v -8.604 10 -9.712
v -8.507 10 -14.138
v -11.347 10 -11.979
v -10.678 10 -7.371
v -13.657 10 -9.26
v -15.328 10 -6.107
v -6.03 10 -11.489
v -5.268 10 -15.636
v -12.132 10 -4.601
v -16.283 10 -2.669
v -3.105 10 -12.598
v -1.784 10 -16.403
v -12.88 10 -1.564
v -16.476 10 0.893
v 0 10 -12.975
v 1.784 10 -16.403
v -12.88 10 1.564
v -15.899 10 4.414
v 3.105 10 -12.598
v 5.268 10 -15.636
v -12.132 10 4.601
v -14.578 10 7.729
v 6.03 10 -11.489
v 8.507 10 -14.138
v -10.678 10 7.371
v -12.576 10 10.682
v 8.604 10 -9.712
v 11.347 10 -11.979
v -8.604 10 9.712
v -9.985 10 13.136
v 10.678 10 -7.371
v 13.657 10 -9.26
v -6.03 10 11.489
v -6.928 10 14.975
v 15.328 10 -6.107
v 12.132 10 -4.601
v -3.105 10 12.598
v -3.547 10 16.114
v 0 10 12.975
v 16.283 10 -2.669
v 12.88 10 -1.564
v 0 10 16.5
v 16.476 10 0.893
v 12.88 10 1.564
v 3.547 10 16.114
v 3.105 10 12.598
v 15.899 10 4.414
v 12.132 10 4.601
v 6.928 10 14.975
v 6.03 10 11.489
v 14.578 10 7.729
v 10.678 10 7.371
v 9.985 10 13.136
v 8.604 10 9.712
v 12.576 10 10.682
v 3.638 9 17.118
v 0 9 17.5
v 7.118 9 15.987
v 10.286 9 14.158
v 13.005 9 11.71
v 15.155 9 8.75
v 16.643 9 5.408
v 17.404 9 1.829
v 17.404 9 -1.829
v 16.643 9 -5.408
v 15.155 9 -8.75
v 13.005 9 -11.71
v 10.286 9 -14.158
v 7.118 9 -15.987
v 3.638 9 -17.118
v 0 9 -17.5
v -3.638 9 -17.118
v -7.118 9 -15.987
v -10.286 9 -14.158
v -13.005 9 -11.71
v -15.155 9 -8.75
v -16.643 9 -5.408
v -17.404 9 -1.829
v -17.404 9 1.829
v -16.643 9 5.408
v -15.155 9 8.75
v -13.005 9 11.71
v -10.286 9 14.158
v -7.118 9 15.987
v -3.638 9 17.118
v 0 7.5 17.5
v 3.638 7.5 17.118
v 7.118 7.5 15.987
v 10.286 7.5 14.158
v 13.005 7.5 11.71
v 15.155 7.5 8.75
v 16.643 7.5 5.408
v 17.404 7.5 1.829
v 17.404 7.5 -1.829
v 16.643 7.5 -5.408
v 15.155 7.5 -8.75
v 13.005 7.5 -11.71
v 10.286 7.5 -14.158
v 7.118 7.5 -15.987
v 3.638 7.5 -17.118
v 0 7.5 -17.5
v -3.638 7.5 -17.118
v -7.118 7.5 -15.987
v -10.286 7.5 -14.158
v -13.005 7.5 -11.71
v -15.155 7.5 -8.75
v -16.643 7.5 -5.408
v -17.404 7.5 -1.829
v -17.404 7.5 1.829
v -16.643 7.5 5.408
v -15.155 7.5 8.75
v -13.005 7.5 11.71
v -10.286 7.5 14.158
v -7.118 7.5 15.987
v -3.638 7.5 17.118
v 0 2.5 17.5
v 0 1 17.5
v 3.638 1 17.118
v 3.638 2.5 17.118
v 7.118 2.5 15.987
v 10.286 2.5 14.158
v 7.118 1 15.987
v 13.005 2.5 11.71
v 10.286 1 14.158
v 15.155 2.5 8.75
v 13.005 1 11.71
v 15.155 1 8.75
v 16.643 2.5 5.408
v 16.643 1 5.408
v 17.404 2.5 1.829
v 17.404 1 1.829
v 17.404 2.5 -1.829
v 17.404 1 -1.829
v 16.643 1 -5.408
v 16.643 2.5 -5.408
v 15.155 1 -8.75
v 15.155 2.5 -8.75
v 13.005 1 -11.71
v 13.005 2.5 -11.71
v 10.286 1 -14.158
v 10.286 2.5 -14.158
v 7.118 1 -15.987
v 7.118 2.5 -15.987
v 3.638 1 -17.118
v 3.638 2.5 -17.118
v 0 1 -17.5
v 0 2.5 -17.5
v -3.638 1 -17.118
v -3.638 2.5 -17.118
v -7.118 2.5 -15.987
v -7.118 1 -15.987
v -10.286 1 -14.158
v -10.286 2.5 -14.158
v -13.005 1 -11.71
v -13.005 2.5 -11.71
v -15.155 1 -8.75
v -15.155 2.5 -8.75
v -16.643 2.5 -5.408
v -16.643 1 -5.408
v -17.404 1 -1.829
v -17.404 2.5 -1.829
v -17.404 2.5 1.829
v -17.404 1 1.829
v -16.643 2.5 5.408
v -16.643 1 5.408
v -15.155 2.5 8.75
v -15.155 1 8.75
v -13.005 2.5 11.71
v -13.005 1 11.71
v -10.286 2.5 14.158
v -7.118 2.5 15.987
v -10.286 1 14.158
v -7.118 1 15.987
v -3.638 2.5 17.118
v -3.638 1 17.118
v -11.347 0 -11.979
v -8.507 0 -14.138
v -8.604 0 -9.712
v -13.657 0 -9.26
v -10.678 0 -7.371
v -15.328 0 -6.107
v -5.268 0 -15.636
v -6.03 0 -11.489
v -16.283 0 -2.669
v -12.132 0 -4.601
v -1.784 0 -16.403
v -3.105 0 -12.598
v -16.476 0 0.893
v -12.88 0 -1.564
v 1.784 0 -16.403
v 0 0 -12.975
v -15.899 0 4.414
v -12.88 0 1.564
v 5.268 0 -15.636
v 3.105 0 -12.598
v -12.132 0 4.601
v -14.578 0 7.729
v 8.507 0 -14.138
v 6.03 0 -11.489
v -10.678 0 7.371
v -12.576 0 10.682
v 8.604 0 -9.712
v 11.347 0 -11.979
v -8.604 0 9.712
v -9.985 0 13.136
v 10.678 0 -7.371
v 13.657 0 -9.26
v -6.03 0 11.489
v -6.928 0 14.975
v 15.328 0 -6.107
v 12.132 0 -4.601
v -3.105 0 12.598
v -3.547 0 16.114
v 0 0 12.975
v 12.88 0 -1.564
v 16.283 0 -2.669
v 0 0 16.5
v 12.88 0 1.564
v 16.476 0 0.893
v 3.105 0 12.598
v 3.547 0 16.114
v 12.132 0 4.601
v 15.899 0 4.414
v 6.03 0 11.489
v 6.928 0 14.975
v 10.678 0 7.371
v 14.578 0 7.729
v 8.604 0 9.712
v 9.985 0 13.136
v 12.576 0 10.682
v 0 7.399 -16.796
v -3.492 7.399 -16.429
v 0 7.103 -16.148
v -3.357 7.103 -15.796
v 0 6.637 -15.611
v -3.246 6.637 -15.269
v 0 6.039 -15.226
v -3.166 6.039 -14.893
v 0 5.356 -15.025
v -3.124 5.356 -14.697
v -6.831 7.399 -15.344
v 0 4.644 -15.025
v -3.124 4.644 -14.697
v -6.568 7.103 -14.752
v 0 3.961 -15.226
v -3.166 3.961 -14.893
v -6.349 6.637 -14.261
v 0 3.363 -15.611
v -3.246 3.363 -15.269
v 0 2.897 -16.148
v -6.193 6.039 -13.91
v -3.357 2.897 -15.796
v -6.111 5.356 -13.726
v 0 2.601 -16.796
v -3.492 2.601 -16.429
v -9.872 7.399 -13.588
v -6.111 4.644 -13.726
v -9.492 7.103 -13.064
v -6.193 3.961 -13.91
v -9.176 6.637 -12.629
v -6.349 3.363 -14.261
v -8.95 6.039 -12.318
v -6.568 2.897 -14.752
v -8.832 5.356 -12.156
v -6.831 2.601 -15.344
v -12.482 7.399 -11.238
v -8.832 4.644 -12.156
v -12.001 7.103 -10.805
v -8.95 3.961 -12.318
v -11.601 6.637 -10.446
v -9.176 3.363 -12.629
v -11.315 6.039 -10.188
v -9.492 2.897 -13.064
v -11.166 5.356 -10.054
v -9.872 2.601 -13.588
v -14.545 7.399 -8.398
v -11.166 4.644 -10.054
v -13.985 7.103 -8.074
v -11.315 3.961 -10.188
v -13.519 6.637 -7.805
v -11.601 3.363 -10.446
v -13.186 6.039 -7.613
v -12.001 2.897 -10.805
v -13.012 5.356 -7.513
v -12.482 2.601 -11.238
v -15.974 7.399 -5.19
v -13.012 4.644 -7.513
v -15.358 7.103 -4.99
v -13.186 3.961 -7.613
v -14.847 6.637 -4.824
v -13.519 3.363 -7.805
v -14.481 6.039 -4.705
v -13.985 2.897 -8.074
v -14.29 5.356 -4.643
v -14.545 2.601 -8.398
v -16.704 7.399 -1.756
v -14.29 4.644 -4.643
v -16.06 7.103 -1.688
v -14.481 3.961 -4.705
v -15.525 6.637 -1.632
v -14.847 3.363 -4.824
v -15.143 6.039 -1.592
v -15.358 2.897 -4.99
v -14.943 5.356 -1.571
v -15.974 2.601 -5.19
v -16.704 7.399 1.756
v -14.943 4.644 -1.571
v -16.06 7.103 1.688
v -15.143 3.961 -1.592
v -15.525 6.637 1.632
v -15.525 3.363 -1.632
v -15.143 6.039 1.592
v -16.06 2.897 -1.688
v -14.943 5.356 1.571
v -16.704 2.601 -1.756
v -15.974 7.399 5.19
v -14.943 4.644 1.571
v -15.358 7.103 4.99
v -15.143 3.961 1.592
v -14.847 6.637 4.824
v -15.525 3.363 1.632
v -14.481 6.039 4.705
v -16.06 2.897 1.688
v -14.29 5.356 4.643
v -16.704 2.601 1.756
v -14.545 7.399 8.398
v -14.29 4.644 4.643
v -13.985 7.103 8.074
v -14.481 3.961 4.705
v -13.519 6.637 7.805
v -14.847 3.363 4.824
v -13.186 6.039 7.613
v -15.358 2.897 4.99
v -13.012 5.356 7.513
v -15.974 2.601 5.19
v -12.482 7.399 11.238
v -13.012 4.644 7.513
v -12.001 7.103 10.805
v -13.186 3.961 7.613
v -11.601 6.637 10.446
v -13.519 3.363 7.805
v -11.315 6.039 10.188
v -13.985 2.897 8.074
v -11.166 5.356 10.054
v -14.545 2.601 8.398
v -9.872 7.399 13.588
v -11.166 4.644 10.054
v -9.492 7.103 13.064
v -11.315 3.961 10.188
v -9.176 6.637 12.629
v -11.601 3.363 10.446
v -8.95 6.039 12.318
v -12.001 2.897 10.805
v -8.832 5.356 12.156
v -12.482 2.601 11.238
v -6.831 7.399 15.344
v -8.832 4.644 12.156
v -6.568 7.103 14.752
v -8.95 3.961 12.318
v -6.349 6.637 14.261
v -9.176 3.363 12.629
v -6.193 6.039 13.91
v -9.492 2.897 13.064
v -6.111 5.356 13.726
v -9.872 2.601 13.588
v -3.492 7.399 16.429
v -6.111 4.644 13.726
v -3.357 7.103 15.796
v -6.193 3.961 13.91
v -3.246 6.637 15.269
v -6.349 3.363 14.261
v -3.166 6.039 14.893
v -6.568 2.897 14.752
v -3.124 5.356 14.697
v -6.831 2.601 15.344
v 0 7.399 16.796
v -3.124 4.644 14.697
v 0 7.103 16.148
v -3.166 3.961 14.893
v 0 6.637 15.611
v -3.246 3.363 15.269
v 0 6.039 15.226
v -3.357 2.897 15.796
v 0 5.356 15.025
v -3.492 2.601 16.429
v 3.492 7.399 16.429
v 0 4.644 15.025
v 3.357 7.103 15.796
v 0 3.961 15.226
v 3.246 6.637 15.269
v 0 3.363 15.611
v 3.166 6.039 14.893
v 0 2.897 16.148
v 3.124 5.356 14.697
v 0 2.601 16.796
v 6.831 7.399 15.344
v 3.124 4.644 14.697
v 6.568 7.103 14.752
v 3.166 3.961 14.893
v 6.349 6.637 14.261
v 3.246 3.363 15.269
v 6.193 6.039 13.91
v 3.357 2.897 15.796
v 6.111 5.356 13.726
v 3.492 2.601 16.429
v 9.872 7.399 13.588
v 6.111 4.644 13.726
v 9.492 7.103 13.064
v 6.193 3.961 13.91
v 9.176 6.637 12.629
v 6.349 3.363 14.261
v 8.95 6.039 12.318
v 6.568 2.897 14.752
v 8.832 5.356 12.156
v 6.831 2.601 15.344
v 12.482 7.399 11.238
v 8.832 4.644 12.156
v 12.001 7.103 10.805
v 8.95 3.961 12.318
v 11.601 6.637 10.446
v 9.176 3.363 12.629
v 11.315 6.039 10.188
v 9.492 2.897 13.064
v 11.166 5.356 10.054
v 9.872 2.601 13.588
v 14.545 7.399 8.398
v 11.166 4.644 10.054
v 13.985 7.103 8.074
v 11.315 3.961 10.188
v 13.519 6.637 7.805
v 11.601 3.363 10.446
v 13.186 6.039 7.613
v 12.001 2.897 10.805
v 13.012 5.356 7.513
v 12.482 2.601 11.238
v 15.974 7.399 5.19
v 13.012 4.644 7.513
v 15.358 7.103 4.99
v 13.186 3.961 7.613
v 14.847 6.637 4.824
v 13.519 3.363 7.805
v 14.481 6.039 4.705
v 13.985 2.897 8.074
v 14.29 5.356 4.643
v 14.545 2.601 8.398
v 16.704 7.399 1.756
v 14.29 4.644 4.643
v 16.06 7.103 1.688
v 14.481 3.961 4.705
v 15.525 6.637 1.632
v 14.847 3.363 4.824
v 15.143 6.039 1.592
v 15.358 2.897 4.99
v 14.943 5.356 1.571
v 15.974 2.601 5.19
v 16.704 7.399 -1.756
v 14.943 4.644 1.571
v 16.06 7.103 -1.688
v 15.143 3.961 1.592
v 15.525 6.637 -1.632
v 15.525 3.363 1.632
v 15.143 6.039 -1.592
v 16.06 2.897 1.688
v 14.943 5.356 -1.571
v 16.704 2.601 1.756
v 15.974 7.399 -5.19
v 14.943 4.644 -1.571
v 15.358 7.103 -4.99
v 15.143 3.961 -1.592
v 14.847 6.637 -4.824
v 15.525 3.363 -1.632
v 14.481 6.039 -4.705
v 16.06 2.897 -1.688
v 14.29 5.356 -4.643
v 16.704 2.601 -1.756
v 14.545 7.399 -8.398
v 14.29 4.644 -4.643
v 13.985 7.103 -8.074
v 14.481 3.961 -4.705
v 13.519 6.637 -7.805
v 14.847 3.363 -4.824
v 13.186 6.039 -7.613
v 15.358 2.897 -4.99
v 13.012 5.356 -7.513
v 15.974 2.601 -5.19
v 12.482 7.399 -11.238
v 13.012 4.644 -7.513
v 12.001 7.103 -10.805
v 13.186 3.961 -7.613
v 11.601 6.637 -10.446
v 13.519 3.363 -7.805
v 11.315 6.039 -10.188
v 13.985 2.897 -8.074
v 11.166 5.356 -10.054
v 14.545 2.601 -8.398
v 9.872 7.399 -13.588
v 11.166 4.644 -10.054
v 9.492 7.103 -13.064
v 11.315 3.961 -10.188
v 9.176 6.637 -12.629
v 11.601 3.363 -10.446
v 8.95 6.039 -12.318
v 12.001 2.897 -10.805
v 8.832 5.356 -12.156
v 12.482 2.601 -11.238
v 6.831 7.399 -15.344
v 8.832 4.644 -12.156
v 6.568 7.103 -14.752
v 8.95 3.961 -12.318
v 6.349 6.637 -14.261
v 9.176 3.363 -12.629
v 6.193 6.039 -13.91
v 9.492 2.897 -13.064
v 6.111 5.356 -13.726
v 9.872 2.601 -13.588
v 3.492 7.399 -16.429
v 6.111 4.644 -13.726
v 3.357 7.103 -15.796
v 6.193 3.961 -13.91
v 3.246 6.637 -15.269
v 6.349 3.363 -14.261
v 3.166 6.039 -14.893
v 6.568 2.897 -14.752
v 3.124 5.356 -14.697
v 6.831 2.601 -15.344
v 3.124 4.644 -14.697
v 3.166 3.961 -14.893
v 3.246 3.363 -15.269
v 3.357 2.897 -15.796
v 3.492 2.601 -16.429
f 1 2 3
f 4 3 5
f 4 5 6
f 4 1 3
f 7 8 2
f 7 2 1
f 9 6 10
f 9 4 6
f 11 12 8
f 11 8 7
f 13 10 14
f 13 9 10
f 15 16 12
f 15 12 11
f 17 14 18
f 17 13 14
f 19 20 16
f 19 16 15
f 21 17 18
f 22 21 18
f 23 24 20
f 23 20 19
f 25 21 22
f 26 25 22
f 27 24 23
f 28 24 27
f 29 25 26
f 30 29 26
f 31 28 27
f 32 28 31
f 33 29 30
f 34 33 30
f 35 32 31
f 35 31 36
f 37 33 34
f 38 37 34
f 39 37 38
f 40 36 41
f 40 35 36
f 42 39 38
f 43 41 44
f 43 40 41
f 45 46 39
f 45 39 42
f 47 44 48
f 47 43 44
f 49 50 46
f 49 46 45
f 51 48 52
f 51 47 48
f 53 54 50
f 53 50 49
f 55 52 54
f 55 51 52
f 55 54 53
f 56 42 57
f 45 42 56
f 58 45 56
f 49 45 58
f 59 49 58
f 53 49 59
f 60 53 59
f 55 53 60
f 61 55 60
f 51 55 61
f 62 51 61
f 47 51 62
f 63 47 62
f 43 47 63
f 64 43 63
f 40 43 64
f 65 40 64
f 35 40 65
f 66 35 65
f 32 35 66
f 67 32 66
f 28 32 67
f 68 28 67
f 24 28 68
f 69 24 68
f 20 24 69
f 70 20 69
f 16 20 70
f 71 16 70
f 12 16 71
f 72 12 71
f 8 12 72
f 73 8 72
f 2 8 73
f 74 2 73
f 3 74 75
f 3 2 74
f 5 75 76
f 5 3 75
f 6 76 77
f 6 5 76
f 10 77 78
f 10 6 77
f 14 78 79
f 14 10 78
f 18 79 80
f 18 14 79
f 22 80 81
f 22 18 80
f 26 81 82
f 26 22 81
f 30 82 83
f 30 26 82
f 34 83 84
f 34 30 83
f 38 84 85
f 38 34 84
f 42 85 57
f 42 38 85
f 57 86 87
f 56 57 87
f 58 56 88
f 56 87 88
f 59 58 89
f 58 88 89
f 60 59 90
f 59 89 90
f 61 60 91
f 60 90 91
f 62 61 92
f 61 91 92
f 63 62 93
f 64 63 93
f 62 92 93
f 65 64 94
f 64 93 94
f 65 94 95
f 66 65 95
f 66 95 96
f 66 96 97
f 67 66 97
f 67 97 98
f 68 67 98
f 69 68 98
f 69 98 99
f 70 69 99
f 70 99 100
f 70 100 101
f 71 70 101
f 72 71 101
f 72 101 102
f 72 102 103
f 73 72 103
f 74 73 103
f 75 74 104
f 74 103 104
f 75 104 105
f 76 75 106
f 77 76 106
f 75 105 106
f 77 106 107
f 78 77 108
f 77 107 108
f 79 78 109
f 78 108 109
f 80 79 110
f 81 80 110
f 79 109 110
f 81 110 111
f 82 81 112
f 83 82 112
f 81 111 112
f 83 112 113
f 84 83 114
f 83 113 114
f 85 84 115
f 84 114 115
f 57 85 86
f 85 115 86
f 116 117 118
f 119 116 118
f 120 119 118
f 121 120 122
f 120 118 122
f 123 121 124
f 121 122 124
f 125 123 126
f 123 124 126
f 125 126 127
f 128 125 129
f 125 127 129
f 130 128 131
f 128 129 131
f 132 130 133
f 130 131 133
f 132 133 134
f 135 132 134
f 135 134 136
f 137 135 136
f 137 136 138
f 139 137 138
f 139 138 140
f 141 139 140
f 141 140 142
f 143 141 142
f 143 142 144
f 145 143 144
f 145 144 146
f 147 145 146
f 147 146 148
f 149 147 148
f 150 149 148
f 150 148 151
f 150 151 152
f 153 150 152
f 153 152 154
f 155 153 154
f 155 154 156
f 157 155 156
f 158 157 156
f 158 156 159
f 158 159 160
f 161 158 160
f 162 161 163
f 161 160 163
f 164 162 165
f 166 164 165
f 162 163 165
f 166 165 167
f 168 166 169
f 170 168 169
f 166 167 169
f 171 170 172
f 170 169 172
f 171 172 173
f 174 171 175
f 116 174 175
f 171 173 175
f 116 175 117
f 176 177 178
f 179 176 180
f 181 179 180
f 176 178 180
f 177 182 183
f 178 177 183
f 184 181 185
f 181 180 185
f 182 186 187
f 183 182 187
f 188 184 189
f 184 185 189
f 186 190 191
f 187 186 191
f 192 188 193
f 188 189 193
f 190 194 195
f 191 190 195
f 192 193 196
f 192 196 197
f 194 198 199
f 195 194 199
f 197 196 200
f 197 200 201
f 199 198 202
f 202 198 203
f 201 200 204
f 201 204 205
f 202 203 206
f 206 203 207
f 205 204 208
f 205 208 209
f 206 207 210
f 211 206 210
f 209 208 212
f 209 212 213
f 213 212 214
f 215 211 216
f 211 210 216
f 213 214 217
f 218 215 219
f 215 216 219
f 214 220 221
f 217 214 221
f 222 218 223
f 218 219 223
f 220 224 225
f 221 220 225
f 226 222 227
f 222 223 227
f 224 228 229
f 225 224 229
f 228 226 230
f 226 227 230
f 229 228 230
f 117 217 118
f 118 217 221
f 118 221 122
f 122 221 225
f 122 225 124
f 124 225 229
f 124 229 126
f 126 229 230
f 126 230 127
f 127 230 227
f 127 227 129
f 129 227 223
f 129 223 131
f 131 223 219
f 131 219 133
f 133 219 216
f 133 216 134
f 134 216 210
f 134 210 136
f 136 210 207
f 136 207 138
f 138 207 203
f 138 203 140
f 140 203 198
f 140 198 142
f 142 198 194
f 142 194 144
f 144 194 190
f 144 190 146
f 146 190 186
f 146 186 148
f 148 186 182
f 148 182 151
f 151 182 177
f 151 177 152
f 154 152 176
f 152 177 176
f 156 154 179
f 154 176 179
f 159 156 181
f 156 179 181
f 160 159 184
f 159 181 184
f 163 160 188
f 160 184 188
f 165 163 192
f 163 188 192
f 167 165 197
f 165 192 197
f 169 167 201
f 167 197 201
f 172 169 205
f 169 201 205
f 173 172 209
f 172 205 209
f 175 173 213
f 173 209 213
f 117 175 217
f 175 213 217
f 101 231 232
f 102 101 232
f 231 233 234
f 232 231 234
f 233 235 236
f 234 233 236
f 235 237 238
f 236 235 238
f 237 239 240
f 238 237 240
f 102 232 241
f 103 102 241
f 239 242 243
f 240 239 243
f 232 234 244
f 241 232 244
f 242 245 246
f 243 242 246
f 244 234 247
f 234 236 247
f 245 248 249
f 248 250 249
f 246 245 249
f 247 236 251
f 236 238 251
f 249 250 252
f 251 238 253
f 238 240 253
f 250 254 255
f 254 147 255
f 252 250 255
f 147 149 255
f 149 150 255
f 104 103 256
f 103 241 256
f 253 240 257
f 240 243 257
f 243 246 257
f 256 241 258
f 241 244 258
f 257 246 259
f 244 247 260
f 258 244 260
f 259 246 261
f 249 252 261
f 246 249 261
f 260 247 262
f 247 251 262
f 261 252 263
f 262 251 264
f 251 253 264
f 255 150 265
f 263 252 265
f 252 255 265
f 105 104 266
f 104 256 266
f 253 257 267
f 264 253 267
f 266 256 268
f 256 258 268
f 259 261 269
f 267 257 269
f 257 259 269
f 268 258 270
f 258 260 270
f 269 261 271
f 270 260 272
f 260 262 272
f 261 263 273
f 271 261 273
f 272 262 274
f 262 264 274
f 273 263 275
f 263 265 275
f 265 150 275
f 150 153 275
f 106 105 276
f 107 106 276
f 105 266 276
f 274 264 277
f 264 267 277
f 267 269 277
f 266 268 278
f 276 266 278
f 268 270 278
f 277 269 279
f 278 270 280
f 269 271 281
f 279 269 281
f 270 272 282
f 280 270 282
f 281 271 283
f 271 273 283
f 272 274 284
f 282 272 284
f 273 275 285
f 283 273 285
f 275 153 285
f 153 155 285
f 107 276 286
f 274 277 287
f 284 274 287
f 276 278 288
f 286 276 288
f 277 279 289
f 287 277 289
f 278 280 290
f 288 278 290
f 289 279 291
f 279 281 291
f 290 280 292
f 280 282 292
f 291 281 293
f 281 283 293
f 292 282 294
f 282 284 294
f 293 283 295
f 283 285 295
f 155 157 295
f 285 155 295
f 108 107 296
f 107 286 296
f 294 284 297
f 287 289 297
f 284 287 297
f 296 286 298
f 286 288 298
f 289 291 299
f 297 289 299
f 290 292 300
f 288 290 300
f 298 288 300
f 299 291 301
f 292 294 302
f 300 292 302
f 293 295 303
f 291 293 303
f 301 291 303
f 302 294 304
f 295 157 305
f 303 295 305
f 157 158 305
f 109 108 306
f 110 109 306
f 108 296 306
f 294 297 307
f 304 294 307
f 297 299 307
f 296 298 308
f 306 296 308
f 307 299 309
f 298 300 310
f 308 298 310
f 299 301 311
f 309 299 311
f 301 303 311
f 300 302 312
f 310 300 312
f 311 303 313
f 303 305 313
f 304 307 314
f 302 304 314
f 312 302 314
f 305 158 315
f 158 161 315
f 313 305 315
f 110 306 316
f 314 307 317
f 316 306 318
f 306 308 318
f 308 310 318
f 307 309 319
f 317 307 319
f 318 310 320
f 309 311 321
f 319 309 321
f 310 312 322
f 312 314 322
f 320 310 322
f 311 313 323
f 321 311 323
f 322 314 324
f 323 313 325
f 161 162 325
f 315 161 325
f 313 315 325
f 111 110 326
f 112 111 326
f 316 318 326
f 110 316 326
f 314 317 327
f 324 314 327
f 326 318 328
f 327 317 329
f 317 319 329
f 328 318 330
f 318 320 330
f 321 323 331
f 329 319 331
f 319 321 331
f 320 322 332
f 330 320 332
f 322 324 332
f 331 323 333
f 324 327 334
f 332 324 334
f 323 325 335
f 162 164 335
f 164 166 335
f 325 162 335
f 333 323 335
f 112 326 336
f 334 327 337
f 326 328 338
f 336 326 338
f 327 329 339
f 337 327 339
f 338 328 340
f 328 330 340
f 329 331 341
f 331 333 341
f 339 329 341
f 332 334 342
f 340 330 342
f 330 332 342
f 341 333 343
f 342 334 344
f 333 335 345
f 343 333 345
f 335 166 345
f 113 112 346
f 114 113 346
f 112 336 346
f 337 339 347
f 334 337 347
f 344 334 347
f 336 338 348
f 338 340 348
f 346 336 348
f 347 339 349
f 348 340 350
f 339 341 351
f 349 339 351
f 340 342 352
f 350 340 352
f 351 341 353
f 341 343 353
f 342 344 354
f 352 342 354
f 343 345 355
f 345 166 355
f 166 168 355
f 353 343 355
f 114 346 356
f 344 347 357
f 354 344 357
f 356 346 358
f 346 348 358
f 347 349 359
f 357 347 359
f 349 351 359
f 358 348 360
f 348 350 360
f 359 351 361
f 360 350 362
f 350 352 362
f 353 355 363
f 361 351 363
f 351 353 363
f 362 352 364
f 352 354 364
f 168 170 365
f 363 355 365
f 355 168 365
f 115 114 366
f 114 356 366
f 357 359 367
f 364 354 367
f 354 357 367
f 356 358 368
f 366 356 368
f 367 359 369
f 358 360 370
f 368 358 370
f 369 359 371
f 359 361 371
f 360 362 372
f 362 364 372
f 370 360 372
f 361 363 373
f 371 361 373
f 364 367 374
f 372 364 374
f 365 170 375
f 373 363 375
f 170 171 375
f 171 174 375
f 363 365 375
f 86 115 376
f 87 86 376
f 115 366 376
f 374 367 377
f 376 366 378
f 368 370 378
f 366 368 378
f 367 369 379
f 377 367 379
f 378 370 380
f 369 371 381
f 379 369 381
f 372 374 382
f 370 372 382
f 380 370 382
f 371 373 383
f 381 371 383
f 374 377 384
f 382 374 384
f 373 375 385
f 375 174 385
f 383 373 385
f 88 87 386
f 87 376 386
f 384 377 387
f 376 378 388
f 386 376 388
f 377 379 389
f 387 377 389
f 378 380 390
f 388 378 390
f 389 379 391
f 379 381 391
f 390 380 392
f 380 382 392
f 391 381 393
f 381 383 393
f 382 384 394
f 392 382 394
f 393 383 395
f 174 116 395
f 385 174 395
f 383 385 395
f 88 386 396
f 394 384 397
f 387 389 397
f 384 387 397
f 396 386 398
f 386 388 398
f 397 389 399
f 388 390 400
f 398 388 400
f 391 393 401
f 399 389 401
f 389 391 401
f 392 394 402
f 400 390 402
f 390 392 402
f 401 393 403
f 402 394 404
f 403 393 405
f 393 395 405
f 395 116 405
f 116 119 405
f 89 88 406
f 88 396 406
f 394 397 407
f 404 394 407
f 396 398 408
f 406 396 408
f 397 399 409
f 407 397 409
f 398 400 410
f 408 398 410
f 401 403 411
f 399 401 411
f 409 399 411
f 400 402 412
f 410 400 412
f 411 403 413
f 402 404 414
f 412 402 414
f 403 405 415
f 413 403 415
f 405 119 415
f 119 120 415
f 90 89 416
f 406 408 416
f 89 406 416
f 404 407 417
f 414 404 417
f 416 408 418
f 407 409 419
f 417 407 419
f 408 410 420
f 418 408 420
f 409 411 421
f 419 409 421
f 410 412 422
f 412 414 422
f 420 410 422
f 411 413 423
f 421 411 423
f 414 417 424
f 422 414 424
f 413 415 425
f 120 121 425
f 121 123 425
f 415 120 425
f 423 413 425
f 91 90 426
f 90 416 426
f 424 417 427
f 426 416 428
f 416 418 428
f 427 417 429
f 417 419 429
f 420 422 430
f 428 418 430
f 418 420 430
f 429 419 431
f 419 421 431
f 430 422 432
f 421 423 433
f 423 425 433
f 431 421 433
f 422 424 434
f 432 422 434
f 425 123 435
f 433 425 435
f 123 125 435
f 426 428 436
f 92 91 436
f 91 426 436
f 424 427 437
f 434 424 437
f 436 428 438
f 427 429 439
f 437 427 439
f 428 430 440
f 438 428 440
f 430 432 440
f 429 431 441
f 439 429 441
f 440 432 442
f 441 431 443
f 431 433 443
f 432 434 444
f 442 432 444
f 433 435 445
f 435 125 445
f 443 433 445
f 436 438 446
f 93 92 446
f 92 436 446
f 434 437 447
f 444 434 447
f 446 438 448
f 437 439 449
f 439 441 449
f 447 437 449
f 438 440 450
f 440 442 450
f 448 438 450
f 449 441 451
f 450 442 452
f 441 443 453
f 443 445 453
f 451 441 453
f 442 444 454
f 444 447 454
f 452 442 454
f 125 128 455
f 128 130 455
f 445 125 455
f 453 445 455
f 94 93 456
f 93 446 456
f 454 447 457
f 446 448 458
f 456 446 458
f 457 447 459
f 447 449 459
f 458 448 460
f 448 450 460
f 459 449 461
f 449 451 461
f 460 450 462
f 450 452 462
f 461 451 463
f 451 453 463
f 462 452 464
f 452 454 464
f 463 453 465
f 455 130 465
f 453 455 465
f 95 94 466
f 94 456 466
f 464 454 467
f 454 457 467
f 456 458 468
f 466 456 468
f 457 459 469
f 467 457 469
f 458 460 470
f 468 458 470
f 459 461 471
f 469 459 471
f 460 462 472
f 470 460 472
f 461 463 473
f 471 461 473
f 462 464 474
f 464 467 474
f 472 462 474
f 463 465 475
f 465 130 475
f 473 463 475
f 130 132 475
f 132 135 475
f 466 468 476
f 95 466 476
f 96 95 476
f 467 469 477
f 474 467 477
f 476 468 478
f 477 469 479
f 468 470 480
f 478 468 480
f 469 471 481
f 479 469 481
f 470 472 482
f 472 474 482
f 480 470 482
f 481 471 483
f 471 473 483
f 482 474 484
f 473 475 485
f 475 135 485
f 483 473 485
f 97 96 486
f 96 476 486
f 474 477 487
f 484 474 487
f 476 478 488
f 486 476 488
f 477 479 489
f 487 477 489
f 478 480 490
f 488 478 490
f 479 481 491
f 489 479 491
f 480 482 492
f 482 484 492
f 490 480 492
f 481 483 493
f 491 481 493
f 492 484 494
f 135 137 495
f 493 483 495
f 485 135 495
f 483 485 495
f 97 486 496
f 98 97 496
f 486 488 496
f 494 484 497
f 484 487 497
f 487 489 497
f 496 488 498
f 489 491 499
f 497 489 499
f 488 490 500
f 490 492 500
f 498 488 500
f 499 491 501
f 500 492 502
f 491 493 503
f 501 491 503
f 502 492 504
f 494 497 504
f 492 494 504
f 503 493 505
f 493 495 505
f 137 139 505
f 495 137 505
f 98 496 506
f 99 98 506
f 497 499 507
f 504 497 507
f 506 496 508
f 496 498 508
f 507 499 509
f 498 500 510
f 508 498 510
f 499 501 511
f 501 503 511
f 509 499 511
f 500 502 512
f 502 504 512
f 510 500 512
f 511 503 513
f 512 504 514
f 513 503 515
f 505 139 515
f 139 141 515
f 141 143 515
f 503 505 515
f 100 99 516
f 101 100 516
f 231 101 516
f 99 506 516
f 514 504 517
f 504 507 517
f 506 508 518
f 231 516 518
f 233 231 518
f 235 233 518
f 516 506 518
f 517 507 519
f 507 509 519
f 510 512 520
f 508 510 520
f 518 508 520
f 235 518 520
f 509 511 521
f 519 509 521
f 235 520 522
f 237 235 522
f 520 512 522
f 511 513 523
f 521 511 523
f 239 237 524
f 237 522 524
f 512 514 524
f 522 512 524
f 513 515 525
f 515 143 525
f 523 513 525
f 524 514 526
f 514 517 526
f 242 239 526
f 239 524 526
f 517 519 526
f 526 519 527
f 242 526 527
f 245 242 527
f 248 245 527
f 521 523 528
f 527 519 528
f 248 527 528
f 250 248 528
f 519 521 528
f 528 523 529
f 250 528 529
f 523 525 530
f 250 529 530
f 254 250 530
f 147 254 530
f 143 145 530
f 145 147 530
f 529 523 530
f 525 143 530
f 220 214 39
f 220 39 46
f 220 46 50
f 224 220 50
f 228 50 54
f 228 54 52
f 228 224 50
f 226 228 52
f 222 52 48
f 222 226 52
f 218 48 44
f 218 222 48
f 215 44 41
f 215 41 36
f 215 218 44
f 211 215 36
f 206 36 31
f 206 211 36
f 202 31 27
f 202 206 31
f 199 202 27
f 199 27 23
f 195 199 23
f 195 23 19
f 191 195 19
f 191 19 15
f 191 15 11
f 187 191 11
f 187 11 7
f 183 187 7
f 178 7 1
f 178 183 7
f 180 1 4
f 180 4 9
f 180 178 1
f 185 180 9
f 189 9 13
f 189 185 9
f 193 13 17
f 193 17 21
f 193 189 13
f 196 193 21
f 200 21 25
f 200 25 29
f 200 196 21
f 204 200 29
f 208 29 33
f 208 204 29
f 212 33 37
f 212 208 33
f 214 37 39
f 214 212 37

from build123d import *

# Parameters (mm, degrees)
SKETCH1_R                 = 17.5
SKETCH1_R_2               = 12.975
CORPO_EXTERNO_35_10_DEPTH = 10
CHANFROS_1_45_SIZE        = 1


with BuildPart() as part:
    # Sketch1 → Corpo Externo Ø35×10 (new body)
    with BuildSketch(Plane(origin=(0, 0, 0), x_dir=(1, 0, 0), z_dir=(0, 1, 0))):
        with Locations(Location((0, 0, 0), (0, 0, 270))):
            Circle(SKETCH1_R)
        with Locations(Location((0, 0, 0), (0, 0, 270))):
            Circle(SKETCH1_R_2, mode=Mode.SUBTRACT)
    extrude(amount=CORPO_EXTERNO_35_10_DEPTH)

    # Chanfros 1×45°
    chanfros_1_45_edges = [part.edges().sort_by_distance(p)[0] for p in [
        (0, 10, -17.5),
        (0, 0, -17.5),
    ]]
    chamfer(chanfros_1_45_edges, length=CHANFROS_1_45_SIZE)

    # Sketch2 → Canal (revolve, cut)
    with BuildSketch(Plane.XY, mode=Mode.PRIVATE) as canal_sk:
        with BuildLine():
            ThreePointArc((-17.5, 7.5), (-15, 5), (-17.5, 2.5))
            Line((-17.5, 2.5), (-17.5, 7.5))
        make_face()
    revolve(canal_sk.sketch.rotate(Axis((0, 0, 0), (0, 1, 0)), 270), axis=Axis((0, 0, 0), (0, 1, 0)), mode=Mode.SUBTRACT)


solid = part.part
